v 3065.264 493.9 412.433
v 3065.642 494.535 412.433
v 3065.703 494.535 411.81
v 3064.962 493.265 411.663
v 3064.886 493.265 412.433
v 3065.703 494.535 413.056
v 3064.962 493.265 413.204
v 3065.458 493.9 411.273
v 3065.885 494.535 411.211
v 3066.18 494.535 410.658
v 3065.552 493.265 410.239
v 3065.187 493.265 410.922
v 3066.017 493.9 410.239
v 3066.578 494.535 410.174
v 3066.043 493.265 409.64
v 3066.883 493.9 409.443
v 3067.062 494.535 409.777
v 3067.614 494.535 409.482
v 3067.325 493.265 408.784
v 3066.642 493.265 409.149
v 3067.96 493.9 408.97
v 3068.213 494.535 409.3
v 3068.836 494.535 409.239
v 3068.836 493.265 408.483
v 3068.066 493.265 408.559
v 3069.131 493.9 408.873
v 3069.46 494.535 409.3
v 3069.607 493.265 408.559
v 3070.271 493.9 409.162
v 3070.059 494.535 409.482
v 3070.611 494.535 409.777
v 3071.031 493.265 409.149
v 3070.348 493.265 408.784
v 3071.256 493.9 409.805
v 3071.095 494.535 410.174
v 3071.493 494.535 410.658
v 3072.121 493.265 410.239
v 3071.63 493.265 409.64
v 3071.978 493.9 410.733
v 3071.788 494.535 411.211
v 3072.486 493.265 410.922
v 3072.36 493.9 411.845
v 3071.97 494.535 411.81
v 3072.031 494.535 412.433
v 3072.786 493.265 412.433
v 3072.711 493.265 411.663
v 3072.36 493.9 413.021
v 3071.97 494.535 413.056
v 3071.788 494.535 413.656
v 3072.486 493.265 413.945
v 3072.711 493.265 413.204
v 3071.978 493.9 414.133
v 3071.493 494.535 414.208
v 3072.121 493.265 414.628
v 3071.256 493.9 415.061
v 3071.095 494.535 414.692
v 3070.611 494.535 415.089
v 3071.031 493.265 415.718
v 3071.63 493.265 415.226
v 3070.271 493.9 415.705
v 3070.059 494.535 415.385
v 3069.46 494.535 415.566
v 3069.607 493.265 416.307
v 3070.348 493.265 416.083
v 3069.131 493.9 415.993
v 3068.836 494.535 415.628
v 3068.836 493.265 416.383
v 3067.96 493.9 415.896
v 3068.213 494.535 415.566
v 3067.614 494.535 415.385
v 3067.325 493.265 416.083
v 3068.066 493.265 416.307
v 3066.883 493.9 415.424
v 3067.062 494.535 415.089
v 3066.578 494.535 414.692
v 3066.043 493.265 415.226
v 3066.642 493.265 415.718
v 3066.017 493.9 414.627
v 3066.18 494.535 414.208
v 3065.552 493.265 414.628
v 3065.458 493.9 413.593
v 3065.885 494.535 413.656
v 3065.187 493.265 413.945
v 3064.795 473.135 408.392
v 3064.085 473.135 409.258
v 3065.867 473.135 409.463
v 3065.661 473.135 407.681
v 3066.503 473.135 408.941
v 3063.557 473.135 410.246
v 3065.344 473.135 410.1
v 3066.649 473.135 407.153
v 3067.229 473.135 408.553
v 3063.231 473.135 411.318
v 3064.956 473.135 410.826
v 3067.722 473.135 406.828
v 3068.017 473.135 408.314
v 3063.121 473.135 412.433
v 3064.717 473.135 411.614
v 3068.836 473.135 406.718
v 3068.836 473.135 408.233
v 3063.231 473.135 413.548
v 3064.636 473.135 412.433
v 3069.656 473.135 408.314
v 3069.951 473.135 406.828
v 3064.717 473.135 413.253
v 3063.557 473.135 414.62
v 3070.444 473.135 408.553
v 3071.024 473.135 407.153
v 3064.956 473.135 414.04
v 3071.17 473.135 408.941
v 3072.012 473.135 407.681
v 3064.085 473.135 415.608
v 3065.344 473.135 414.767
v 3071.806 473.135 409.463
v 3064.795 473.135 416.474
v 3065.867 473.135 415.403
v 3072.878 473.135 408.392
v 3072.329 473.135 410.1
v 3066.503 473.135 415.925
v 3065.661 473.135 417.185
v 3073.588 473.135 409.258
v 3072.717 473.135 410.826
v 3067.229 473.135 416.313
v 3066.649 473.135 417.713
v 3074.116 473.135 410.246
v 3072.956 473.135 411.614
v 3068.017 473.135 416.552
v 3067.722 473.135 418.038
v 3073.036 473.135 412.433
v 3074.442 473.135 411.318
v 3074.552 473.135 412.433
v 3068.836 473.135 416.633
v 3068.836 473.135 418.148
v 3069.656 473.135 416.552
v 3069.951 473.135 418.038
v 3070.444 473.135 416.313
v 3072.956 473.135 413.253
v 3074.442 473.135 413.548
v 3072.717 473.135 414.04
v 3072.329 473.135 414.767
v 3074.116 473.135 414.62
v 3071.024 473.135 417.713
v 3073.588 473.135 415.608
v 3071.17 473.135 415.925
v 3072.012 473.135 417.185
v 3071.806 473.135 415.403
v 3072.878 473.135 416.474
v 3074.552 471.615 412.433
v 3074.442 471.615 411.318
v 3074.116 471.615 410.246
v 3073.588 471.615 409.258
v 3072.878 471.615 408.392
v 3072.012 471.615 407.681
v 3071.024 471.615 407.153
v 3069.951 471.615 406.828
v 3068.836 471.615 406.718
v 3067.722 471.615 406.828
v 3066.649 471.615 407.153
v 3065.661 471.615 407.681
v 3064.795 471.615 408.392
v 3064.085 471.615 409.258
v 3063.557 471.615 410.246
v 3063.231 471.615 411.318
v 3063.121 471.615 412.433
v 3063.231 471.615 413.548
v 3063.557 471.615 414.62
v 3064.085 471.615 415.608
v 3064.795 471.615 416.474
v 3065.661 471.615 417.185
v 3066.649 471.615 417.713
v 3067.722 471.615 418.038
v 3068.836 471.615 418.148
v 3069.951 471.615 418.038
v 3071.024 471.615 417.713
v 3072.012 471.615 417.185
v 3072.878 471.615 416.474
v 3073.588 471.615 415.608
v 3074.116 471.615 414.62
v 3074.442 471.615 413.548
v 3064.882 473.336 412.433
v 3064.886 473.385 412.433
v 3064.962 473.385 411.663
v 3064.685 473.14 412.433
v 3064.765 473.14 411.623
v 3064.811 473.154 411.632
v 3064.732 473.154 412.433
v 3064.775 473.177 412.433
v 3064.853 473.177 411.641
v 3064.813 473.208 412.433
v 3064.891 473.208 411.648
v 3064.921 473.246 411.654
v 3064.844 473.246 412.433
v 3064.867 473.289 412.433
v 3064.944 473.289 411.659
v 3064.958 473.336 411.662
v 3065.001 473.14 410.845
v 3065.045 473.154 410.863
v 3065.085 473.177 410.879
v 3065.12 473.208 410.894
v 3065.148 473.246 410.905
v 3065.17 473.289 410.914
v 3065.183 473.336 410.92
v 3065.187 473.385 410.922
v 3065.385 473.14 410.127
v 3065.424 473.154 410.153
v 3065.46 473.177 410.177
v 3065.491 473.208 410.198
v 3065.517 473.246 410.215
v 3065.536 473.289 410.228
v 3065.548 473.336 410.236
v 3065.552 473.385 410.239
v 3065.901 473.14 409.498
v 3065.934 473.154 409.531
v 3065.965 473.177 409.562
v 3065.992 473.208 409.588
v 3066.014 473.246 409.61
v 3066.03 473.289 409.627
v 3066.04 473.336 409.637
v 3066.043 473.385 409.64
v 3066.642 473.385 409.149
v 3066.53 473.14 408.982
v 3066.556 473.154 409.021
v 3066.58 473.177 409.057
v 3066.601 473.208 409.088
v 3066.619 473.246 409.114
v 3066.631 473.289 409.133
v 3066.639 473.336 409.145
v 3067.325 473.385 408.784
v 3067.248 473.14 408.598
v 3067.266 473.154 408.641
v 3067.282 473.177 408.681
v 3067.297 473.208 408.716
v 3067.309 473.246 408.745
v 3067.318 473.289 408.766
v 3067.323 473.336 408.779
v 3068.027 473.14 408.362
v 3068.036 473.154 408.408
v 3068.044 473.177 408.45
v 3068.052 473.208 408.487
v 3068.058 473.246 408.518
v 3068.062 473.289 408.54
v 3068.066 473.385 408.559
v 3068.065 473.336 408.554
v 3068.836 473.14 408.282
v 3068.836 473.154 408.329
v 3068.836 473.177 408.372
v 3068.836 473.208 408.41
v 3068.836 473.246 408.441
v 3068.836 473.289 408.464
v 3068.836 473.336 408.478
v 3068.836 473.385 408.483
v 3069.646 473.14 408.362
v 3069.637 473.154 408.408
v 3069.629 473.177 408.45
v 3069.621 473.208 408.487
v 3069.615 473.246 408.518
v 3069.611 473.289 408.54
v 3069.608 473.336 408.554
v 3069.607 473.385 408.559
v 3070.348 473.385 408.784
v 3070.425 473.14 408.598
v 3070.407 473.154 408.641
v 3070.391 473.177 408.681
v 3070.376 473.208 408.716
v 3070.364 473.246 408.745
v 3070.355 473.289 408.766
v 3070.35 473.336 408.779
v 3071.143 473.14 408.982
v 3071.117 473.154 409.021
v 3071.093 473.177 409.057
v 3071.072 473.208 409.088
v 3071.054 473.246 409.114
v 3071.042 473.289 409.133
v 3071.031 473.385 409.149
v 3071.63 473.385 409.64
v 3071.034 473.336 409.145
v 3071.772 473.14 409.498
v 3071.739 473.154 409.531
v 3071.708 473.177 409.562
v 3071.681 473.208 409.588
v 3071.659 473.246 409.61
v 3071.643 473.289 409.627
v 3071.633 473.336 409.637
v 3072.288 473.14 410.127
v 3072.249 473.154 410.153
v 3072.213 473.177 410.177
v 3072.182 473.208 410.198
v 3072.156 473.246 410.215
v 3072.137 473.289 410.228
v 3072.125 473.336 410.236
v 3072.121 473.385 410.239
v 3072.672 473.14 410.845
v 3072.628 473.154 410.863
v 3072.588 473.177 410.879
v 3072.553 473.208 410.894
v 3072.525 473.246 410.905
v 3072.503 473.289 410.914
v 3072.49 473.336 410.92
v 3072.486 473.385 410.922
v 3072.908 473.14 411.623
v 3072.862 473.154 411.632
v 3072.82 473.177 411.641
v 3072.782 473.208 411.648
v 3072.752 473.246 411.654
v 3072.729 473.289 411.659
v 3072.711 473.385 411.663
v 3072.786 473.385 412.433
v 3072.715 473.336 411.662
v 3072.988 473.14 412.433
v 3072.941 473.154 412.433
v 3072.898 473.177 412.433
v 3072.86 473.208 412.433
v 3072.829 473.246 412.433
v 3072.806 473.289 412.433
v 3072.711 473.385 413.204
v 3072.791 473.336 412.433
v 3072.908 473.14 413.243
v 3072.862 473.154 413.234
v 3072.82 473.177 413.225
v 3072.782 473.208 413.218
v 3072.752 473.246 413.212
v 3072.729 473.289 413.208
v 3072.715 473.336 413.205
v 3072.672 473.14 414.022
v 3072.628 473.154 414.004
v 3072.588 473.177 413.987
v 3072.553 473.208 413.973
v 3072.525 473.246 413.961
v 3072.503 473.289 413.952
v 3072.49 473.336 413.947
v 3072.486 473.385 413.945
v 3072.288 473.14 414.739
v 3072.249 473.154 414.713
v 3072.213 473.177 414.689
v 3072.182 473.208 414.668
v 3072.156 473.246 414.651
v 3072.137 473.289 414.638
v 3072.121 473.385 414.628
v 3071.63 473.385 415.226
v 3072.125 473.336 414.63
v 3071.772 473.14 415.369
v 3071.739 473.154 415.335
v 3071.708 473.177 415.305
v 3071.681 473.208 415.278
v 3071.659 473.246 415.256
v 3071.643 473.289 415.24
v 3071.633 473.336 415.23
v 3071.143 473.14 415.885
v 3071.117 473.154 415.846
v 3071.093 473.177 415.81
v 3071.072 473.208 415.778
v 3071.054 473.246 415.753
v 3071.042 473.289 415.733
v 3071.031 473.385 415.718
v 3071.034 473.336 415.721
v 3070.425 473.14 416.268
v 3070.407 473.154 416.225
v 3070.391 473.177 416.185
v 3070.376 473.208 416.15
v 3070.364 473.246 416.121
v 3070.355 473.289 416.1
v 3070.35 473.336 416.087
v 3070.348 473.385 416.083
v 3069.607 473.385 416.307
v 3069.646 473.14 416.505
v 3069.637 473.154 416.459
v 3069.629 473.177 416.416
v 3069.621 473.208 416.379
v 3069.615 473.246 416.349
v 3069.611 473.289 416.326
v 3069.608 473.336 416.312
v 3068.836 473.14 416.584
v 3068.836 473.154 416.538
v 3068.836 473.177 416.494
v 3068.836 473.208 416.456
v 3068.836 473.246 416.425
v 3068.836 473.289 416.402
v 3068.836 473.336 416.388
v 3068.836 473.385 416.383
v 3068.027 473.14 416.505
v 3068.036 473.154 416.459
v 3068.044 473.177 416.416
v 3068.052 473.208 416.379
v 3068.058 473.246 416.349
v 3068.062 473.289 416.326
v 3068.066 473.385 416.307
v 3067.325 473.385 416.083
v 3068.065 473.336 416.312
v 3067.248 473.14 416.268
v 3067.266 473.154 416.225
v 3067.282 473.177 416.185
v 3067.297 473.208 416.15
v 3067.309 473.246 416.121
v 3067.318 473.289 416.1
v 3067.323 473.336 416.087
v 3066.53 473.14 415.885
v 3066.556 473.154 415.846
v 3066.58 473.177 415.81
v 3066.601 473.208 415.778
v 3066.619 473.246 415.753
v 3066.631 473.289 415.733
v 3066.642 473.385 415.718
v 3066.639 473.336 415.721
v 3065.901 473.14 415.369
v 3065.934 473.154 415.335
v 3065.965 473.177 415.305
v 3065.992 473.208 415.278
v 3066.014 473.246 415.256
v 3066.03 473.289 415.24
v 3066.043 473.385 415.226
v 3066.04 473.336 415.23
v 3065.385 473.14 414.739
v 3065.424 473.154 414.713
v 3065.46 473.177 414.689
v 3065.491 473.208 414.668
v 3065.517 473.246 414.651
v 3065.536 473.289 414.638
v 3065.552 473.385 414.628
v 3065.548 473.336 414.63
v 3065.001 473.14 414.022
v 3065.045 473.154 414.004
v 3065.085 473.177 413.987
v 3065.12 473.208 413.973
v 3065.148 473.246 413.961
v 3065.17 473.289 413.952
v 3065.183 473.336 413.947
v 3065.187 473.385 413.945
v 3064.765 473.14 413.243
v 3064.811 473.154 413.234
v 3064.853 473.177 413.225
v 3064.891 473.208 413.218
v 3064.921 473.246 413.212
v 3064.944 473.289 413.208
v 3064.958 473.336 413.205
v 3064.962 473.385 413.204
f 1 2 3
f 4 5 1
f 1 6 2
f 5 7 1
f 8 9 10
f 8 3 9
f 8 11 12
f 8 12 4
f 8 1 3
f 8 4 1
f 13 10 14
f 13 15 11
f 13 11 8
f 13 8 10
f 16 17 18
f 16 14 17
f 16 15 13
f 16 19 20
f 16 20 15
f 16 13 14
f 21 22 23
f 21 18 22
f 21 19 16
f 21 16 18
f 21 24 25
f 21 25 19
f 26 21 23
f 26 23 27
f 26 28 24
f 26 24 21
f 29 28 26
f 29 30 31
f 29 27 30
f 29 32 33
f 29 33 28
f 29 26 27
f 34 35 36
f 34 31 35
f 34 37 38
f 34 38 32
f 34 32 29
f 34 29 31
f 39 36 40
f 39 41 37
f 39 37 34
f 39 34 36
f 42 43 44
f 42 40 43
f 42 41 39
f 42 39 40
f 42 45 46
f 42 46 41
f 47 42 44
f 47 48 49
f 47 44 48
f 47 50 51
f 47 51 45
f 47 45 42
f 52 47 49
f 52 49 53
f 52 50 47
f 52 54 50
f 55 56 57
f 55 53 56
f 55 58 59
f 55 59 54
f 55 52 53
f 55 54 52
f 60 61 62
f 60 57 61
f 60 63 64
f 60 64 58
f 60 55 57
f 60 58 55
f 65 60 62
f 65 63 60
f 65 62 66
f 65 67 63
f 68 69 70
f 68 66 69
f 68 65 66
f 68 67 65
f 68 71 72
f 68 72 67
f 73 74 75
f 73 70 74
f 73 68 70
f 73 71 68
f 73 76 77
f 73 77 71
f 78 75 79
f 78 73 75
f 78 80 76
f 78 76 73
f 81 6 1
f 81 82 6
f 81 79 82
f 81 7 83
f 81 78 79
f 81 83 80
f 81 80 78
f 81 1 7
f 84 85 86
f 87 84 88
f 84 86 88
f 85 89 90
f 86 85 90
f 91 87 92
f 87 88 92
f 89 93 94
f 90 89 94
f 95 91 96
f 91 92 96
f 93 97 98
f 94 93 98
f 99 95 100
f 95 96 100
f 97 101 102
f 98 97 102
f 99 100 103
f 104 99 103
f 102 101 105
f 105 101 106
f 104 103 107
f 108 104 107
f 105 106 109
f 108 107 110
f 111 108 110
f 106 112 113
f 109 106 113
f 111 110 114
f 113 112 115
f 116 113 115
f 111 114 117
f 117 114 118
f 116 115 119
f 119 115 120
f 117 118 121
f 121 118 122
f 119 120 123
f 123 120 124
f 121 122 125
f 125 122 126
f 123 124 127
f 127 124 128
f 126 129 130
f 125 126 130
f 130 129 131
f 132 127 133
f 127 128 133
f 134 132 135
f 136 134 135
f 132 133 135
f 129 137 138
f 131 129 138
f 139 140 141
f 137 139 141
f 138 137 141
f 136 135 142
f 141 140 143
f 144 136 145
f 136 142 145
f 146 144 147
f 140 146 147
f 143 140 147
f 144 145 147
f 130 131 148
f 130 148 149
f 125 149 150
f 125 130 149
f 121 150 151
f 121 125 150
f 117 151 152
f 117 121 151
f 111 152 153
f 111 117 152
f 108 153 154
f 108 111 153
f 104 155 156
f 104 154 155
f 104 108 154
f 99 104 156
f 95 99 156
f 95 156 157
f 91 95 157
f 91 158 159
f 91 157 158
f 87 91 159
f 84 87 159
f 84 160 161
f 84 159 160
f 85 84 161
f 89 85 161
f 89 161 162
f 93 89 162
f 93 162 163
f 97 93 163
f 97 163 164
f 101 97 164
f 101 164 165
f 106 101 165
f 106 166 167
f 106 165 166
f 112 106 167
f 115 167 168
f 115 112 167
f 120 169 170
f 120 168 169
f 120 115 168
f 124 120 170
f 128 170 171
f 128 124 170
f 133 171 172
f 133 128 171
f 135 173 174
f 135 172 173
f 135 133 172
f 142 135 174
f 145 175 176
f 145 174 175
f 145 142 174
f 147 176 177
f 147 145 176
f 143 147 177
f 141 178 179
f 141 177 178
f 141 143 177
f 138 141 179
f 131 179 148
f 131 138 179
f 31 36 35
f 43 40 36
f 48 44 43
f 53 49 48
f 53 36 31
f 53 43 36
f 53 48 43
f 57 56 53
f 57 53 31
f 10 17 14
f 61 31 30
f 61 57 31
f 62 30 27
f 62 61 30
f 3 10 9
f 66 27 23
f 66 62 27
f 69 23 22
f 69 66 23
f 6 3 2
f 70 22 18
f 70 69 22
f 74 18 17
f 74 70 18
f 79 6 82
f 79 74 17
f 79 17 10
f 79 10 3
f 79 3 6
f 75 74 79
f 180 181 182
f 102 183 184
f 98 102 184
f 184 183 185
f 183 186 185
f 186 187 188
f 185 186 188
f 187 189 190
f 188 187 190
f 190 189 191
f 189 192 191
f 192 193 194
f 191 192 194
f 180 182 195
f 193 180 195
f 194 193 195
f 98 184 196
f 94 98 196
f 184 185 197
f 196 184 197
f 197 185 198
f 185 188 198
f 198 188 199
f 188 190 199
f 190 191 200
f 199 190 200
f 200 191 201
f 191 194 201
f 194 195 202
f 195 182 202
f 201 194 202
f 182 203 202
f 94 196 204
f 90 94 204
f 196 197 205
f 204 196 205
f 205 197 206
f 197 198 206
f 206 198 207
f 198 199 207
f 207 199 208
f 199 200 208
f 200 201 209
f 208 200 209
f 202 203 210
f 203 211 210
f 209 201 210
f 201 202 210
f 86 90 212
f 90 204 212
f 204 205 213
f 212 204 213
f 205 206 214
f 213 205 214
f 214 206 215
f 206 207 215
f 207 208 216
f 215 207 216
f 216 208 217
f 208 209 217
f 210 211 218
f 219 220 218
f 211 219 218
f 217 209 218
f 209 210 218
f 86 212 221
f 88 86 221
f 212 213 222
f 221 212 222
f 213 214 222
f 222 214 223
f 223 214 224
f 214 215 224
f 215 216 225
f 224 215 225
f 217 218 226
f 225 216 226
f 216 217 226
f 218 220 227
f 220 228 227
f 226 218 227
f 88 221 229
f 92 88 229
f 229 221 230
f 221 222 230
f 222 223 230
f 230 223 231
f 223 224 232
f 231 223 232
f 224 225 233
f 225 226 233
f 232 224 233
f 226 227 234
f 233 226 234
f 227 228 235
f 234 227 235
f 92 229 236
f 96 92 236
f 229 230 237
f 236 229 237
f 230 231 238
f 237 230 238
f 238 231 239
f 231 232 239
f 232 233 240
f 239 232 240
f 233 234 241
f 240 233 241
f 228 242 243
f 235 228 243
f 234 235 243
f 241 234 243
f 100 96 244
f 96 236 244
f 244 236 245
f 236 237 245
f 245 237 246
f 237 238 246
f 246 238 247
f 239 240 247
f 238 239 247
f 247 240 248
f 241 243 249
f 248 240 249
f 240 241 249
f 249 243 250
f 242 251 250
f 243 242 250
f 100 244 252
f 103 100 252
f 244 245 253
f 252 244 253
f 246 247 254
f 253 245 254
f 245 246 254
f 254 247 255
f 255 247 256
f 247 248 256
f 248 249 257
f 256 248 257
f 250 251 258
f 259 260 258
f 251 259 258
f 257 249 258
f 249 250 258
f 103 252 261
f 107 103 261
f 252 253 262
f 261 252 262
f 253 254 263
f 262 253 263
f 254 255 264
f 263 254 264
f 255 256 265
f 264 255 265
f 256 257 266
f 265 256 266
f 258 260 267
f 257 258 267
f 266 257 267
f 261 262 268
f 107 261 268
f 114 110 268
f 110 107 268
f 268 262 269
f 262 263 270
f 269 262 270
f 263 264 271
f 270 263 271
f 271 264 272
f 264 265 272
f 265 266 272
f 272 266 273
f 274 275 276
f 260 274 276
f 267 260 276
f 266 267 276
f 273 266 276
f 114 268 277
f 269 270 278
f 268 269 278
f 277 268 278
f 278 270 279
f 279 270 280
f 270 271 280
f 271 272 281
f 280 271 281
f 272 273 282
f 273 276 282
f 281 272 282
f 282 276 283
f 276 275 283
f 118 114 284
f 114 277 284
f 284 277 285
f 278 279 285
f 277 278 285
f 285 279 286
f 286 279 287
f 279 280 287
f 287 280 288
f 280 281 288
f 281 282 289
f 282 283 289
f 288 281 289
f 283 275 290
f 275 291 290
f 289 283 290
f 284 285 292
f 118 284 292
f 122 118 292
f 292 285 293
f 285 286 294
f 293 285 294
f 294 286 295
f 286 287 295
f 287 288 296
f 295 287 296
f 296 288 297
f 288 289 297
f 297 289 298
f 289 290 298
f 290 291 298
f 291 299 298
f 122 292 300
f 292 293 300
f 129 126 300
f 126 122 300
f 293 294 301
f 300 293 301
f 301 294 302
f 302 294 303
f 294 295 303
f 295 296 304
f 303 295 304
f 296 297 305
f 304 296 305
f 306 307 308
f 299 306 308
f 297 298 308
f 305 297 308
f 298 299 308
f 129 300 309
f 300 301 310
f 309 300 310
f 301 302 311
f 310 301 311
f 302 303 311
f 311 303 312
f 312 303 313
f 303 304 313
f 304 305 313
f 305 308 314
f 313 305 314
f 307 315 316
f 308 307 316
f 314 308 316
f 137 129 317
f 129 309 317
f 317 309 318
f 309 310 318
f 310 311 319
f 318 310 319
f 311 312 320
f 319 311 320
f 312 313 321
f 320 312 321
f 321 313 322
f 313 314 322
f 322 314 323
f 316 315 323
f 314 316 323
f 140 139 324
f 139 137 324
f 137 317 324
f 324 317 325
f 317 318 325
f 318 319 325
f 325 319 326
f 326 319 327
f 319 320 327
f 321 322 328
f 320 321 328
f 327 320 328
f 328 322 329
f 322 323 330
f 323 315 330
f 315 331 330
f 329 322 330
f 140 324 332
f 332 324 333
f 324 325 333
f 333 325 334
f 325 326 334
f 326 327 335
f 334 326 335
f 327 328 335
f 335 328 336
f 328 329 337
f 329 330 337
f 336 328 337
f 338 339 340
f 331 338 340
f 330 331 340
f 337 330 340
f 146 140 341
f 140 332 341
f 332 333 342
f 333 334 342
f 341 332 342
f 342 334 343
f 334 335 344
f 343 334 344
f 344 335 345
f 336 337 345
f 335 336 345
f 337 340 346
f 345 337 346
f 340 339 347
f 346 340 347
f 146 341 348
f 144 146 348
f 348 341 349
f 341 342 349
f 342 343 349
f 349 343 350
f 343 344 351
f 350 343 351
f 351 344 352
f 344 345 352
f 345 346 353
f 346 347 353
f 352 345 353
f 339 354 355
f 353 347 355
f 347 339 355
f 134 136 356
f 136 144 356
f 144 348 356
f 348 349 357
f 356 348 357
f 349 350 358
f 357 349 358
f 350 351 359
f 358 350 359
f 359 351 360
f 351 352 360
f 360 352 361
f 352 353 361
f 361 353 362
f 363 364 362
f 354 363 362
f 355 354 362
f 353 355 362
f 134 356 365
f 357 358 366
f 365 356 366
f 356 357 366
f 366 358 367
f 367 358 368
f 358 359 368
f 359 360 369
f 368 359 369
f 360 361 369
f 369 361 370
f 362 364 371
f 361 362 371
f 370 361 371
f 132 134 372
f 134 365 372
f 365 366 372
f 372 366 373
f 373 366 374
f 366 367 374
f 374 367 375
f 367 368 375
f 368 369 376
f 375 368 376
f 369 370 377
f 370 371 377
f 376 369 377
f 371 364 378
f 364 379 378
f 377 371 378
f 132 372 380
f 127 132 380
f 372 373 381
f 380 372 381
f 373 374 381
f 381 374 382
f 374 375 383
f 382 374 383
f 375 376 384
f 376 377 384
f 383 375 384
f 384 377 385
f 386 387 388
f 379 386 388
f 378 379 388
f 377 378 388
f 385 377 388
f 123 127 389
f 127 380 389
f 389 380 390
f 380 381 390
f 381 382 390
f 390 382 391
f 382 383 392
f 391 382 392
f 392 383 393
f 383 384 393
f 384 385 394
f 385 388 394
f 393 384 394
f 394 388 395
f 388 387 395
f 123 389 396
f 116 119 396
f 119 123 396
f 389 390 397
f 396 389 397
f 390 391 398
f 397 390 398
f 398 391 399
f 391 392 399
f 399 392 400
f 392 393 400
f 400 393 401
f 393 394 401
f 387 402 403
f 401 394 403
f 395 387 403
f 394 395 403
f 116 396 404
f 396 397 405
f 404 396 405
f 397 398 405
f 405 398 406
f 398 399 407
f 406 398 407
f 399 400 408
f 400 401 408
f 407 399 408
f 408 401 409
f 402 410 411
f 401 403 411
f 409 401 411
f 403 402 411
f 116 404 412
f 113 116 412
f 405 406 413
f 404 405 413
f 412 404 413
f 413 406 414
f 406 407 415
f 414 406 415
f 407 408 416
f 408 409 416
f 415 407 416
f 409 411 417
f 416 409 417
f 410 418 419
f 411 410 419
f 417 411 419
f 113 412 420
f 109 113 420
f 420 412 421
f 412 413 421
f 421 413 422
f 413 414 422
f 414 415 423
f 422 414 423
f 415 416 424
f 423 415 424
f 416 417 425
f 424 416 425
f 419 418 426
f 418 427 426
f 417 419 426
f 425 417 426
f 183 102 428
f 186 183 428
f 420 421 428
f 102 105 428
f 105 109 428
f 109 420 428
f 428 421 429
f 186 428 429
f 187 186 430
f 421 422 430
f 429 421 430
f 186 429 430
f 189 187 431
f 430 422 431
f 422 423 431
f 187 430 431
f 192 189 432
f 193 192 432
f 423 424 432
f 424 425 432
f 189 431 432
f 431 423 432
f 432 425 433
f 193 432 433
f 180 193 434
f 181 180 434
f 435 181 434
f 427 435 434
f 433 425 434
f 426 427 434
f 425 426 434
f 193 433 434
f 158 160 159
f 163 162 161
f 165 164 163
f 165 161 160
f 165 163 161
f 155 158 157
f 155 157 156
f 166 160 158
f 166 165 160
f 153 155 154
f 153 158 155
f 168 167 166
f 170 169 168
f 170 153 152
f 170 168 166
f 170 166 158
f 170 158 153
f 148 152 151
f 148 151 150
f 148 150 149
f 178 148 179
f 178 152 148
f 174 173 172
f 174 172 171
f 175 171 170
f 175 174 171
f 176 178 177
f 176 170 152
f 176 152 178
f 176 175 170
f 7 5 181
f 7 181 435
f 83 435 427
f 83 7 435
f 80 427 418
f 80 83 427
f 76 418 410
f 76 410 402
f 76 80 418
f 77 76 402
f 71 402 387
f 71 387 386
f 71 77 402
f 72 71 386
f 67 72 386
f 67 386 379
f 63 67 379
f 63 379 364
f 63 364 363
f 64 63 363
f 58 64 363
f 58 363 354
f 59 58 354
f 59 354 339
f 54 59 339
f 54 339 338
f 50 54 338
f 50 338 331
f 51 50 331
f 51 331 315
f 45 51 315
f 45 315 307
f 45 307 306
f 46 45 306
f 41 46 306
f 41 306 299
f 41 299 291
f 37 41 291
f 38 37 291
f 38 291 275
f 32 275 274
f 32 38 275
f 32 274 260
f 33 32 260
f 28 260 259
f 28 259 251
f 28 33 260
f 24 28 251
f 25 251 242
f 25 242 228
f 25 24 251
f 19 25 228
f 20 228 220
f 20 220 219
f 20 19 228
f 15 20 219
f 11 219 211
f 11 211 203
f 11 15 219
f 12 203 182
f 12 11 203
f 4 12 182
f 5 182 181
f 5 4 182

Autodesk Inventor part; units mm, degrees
ref_plane "YZ Plane" through (0, 0, 0) normal (1, 0, 0) x (0, 1, 0)
ref_plane "XY Plane" through (0, 0, 0) normal (0, 0, 1) x (1, 0, 0)
ref_plane "Work Plane2" through (0, 494.5349, 0) normal (0, 1, 0) x (-1, 0, 0)
sketch "Sketch1" plane through (0, 494.5349, 0) normal (0, 1, 0) x (-1, 0, 0)
  circle A0 centre (-3068.8365, 412.4332) radius 3.2
  line L0 (614.5573, 0) -> (-3687.3438, 0) projected
  line L1 (0, -83.2766) -> (0, 499.6599) projected
  circle A1 centre (-3068.8365, 412.4332) radius 3.95
  point P0 (0, 0)
  dimension "d2" = 6.4
  dimension "d3" = 412.4332
  dimension "d4" = 3068.8364
  dimension "d7" = 7.9
extrude "Extrusion1" add sketch "Sketch1" against normal blind 21.4 contours A0 | A1
sketch "Sketch2" plane through (3068.8365, 473.1349, 412.4332) normal (0, -1, 0) x (1, 0, 0)
  circle A0 centre (0, 0) radius 3.95 projected
  circle A1 centre (0, 0) radius 5.715
  dimension "d8" = 11.43
extrude "Extrusion2" add sketch "Sketch2" along normal blind 1.52 contours A0 | A1
fillet "Fillet1" radius 0.25 1 edges at (3072.7865, 473.1349, 412.4332)
chamfer "Chamfer2" distance 1.27 distance2 0.7554 1 edges at (3072.7865, 494.5349, 412.4332) measured on face at (3068.0463, 480.4349, 416.3034)
properties part number "313-04" material "Steel, High Strength Low Alloy"
